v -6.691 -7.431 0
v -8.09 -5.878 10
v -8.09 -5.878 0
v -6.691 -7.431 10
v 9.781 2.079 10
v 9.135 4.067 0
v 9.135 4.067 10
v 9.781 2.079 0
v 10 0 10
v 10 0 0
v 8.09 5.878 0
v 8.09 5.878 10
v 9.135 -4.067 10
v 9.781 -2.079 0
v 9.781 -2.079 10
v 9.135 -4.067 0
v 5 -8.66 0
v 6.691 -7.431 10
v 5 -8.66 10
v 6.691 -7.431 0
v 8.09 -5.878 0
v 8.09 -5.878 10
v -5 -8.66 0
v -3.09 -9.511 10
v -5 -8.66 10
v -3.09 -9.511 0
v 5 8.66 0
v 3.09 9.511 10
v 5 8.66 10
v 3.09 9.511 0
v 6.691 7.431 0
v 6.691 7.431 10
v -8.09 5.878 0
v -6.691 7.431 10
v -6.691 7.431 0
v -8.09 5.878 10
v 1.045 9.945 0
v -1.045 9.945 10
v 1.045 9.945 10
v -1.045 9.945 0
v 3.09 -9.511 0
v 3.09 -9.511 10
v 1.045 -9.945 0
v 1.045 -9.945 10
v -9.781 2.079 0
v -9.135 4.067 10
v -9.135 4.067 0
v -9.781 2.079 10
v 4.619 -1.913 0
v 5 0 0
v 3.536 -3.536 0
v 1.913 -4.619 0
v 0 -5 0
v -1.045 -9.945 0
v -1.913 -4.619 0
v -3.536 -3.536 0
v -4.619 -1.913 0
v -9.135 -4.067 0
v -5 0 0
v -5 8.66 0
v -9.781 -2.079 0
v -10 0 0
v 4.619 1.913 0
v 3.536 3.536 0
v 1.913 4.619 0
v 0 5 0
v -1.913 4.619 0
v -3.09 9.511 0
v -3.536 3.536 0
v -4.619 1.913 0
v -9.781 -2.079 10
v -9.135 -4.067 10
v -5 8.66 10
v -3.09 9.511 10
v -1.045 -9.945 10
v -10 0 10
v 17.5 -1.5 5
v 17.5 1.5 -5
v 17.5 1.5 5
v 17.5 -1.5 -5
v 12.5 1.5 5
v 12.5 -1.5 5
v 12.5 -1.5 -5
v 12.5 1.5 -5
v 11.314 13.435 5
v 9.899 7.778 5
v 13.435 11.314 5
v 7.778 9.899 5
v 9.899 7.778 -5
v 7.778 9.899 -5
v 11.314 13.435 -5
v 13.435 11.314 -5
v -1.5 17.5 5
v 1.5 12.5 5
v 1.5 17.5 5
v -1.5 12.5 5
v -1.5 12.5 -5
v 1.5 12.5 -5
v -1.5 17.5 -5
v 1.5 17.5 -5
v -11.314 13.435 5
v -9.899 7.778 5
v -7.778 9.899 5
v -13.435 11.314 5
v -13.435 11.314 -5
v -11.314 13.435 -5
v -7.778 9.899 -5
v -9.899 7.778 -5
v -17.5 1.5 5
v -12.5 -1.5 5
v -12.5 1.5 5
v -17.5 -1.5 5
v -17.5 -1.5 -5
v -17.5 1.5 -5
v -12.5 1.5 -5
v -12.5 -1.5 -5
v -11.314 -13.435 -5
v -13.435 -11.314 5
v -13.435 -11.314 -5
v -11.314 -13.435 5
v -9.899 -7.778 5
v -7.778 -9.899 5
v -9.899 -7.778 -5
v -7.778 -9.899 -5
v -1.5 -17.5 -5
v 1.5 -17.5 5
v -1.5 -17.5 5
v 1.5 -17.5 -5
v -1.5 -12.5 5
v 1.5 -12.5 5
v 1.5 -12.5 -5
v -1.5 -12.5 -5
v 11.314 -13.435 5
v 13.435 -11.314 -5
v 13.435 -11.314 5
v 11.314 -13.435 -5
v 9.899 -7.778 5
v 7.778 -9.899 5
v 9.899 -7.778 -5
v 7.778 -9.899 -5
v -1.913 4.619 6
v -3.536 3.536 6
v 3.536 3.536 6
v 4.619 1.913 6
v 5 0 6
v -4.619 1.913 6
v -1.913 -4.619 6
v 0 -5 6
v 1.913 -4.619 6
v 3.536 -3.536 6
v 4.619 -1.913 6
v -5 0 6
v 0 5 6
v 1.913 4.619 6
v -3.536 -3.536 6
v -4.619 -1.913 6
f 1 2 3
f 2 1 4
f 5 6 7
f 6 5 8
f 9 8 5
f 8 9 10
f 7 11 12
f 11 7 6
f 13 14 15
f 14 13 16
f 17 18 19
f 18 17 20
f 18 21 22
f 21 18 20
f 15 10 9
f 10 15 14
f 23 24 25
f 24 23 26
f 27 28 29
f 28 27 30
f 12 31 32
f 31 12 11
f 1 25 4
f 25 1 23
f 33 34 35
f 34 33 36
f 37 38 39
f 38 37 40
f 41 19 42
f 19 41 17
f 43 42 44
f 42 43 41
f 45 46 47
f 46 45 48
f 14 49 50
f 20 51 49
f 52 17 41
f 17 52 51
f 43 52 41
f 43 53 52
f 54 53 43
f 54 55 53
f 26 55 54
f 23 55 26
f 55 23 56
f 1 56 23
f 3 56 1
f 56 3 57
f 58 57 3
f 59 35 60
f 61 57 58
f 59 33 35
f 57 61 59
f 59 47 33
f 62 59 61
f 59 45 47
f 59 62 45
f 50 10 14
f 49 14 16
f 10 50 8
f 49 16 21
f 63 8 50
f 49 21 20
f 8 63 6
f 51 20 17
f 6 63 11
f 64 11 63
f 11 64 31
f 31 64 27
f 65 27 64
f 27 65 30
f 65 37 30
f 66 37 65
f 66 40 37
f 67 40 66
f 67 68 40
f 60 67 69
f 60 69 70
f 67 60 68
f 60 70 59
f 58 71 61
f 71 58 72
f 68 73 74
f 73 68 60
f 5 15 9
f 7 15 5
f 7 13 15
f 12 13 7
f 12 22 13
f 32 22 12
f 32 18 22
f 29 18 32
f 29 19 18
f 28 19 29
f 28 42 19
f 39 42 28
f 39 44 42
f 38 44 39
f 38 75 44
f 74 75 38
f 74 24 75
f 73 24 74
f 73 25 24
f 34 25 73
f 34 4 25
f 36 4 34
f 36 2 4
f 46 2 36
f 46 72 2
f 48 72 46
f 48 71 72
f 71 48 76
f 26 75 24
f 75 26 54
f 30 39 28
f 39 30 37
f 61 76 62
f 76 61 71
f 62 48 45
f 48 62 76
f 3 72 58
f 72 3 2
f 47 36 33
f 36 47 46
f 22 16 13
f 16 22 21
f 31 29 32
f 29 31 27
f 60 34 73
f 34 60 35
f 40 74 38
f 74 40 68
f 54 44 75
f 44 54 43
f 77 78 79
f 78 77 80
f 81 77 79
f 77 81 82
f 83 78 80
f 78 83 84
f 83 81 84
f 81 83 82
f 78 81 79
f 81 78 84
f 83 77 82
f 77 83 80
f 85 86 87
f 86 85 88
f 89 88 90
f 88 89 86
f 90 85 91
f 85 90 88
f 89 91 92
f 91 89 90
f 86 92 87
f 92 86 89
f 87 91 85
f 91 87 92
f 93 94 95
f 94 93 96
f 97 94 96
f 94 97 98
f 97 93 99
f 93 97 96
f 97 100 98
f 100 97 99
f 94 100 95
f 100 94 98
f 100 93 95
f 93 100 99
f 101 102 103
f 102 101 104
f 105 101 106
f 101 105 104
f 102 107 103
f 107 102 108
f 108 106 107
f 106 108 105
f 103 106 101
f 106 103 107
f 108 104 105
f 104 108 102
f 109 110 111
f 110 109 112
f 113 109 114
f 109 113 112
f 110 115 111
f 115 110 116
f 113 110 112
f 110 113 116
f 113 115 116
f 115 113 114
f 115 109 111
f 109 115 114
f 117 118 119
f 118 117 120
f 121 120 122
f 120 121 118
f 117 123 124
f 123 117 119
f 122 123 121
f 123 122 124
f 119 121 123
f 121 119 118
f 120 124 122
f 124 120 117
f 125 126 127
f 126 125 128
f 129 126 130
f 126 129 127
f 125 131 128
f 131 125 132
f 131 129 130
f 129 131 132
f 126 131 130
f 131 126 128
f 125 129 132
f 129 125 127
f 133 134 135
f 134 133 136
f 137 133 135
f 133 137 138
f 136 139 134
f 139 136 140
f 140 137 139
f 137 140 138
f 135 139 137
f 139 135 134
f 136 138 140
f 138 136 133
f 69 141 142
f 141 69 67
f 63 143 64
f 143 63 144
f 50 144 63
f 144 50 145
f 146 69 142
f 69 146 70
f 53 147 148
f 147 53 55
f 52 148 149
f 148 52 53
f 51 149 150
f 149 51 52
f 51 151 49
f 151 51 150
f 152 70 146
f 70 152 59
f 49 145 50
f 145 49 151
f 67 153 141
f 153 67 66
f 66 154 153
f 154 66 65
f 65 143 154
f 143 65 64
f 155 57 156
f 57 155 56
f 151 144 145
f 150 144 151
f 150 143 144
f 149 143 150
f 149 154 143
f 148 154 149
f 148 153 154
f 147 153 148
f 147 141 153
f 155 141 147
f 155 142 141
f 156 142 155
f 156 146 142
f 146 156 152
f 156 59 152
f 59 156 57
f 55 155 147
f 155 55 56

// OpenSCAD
// Gear-like structure (simplified - no for loop)
difference() {
    union() {
        // Central hub
        cylinder(h=10, r=10);
        // Teeth (manually created)
        translate([15, 0, 0]) cube([5, 3, 10], center=true);
        rotate([0, 0, 45]) translate([15, 0, 0]) cube([5, 3, 10], center=true);
        rotate([0, 0, 90]) translate([15, 0, 0]) cube([5, 3, 10], center=true);
        rotate([0, 0, 135]) translate([15, 0, 0]) cube([5, 3, 10], center=true);
        rotate([0, 0, 180]) translate([15, 0, 0]) cube([5, 3, 10], center=true);
        rotate([0, 0, 225]) translate([15, 0, 0]) cube([5, 3, 10], center=true);
        rotate([0, 0, 270]) translate([15, 0, 0]) cube([5, 3, 10], center=true);
        rotate([0, 0, 315]) translate([15, 0, 0]) cube([5, 3, 10], center=true);
    }
    // Center hole
    cylinder(h=12, r=5, center=true);
}
